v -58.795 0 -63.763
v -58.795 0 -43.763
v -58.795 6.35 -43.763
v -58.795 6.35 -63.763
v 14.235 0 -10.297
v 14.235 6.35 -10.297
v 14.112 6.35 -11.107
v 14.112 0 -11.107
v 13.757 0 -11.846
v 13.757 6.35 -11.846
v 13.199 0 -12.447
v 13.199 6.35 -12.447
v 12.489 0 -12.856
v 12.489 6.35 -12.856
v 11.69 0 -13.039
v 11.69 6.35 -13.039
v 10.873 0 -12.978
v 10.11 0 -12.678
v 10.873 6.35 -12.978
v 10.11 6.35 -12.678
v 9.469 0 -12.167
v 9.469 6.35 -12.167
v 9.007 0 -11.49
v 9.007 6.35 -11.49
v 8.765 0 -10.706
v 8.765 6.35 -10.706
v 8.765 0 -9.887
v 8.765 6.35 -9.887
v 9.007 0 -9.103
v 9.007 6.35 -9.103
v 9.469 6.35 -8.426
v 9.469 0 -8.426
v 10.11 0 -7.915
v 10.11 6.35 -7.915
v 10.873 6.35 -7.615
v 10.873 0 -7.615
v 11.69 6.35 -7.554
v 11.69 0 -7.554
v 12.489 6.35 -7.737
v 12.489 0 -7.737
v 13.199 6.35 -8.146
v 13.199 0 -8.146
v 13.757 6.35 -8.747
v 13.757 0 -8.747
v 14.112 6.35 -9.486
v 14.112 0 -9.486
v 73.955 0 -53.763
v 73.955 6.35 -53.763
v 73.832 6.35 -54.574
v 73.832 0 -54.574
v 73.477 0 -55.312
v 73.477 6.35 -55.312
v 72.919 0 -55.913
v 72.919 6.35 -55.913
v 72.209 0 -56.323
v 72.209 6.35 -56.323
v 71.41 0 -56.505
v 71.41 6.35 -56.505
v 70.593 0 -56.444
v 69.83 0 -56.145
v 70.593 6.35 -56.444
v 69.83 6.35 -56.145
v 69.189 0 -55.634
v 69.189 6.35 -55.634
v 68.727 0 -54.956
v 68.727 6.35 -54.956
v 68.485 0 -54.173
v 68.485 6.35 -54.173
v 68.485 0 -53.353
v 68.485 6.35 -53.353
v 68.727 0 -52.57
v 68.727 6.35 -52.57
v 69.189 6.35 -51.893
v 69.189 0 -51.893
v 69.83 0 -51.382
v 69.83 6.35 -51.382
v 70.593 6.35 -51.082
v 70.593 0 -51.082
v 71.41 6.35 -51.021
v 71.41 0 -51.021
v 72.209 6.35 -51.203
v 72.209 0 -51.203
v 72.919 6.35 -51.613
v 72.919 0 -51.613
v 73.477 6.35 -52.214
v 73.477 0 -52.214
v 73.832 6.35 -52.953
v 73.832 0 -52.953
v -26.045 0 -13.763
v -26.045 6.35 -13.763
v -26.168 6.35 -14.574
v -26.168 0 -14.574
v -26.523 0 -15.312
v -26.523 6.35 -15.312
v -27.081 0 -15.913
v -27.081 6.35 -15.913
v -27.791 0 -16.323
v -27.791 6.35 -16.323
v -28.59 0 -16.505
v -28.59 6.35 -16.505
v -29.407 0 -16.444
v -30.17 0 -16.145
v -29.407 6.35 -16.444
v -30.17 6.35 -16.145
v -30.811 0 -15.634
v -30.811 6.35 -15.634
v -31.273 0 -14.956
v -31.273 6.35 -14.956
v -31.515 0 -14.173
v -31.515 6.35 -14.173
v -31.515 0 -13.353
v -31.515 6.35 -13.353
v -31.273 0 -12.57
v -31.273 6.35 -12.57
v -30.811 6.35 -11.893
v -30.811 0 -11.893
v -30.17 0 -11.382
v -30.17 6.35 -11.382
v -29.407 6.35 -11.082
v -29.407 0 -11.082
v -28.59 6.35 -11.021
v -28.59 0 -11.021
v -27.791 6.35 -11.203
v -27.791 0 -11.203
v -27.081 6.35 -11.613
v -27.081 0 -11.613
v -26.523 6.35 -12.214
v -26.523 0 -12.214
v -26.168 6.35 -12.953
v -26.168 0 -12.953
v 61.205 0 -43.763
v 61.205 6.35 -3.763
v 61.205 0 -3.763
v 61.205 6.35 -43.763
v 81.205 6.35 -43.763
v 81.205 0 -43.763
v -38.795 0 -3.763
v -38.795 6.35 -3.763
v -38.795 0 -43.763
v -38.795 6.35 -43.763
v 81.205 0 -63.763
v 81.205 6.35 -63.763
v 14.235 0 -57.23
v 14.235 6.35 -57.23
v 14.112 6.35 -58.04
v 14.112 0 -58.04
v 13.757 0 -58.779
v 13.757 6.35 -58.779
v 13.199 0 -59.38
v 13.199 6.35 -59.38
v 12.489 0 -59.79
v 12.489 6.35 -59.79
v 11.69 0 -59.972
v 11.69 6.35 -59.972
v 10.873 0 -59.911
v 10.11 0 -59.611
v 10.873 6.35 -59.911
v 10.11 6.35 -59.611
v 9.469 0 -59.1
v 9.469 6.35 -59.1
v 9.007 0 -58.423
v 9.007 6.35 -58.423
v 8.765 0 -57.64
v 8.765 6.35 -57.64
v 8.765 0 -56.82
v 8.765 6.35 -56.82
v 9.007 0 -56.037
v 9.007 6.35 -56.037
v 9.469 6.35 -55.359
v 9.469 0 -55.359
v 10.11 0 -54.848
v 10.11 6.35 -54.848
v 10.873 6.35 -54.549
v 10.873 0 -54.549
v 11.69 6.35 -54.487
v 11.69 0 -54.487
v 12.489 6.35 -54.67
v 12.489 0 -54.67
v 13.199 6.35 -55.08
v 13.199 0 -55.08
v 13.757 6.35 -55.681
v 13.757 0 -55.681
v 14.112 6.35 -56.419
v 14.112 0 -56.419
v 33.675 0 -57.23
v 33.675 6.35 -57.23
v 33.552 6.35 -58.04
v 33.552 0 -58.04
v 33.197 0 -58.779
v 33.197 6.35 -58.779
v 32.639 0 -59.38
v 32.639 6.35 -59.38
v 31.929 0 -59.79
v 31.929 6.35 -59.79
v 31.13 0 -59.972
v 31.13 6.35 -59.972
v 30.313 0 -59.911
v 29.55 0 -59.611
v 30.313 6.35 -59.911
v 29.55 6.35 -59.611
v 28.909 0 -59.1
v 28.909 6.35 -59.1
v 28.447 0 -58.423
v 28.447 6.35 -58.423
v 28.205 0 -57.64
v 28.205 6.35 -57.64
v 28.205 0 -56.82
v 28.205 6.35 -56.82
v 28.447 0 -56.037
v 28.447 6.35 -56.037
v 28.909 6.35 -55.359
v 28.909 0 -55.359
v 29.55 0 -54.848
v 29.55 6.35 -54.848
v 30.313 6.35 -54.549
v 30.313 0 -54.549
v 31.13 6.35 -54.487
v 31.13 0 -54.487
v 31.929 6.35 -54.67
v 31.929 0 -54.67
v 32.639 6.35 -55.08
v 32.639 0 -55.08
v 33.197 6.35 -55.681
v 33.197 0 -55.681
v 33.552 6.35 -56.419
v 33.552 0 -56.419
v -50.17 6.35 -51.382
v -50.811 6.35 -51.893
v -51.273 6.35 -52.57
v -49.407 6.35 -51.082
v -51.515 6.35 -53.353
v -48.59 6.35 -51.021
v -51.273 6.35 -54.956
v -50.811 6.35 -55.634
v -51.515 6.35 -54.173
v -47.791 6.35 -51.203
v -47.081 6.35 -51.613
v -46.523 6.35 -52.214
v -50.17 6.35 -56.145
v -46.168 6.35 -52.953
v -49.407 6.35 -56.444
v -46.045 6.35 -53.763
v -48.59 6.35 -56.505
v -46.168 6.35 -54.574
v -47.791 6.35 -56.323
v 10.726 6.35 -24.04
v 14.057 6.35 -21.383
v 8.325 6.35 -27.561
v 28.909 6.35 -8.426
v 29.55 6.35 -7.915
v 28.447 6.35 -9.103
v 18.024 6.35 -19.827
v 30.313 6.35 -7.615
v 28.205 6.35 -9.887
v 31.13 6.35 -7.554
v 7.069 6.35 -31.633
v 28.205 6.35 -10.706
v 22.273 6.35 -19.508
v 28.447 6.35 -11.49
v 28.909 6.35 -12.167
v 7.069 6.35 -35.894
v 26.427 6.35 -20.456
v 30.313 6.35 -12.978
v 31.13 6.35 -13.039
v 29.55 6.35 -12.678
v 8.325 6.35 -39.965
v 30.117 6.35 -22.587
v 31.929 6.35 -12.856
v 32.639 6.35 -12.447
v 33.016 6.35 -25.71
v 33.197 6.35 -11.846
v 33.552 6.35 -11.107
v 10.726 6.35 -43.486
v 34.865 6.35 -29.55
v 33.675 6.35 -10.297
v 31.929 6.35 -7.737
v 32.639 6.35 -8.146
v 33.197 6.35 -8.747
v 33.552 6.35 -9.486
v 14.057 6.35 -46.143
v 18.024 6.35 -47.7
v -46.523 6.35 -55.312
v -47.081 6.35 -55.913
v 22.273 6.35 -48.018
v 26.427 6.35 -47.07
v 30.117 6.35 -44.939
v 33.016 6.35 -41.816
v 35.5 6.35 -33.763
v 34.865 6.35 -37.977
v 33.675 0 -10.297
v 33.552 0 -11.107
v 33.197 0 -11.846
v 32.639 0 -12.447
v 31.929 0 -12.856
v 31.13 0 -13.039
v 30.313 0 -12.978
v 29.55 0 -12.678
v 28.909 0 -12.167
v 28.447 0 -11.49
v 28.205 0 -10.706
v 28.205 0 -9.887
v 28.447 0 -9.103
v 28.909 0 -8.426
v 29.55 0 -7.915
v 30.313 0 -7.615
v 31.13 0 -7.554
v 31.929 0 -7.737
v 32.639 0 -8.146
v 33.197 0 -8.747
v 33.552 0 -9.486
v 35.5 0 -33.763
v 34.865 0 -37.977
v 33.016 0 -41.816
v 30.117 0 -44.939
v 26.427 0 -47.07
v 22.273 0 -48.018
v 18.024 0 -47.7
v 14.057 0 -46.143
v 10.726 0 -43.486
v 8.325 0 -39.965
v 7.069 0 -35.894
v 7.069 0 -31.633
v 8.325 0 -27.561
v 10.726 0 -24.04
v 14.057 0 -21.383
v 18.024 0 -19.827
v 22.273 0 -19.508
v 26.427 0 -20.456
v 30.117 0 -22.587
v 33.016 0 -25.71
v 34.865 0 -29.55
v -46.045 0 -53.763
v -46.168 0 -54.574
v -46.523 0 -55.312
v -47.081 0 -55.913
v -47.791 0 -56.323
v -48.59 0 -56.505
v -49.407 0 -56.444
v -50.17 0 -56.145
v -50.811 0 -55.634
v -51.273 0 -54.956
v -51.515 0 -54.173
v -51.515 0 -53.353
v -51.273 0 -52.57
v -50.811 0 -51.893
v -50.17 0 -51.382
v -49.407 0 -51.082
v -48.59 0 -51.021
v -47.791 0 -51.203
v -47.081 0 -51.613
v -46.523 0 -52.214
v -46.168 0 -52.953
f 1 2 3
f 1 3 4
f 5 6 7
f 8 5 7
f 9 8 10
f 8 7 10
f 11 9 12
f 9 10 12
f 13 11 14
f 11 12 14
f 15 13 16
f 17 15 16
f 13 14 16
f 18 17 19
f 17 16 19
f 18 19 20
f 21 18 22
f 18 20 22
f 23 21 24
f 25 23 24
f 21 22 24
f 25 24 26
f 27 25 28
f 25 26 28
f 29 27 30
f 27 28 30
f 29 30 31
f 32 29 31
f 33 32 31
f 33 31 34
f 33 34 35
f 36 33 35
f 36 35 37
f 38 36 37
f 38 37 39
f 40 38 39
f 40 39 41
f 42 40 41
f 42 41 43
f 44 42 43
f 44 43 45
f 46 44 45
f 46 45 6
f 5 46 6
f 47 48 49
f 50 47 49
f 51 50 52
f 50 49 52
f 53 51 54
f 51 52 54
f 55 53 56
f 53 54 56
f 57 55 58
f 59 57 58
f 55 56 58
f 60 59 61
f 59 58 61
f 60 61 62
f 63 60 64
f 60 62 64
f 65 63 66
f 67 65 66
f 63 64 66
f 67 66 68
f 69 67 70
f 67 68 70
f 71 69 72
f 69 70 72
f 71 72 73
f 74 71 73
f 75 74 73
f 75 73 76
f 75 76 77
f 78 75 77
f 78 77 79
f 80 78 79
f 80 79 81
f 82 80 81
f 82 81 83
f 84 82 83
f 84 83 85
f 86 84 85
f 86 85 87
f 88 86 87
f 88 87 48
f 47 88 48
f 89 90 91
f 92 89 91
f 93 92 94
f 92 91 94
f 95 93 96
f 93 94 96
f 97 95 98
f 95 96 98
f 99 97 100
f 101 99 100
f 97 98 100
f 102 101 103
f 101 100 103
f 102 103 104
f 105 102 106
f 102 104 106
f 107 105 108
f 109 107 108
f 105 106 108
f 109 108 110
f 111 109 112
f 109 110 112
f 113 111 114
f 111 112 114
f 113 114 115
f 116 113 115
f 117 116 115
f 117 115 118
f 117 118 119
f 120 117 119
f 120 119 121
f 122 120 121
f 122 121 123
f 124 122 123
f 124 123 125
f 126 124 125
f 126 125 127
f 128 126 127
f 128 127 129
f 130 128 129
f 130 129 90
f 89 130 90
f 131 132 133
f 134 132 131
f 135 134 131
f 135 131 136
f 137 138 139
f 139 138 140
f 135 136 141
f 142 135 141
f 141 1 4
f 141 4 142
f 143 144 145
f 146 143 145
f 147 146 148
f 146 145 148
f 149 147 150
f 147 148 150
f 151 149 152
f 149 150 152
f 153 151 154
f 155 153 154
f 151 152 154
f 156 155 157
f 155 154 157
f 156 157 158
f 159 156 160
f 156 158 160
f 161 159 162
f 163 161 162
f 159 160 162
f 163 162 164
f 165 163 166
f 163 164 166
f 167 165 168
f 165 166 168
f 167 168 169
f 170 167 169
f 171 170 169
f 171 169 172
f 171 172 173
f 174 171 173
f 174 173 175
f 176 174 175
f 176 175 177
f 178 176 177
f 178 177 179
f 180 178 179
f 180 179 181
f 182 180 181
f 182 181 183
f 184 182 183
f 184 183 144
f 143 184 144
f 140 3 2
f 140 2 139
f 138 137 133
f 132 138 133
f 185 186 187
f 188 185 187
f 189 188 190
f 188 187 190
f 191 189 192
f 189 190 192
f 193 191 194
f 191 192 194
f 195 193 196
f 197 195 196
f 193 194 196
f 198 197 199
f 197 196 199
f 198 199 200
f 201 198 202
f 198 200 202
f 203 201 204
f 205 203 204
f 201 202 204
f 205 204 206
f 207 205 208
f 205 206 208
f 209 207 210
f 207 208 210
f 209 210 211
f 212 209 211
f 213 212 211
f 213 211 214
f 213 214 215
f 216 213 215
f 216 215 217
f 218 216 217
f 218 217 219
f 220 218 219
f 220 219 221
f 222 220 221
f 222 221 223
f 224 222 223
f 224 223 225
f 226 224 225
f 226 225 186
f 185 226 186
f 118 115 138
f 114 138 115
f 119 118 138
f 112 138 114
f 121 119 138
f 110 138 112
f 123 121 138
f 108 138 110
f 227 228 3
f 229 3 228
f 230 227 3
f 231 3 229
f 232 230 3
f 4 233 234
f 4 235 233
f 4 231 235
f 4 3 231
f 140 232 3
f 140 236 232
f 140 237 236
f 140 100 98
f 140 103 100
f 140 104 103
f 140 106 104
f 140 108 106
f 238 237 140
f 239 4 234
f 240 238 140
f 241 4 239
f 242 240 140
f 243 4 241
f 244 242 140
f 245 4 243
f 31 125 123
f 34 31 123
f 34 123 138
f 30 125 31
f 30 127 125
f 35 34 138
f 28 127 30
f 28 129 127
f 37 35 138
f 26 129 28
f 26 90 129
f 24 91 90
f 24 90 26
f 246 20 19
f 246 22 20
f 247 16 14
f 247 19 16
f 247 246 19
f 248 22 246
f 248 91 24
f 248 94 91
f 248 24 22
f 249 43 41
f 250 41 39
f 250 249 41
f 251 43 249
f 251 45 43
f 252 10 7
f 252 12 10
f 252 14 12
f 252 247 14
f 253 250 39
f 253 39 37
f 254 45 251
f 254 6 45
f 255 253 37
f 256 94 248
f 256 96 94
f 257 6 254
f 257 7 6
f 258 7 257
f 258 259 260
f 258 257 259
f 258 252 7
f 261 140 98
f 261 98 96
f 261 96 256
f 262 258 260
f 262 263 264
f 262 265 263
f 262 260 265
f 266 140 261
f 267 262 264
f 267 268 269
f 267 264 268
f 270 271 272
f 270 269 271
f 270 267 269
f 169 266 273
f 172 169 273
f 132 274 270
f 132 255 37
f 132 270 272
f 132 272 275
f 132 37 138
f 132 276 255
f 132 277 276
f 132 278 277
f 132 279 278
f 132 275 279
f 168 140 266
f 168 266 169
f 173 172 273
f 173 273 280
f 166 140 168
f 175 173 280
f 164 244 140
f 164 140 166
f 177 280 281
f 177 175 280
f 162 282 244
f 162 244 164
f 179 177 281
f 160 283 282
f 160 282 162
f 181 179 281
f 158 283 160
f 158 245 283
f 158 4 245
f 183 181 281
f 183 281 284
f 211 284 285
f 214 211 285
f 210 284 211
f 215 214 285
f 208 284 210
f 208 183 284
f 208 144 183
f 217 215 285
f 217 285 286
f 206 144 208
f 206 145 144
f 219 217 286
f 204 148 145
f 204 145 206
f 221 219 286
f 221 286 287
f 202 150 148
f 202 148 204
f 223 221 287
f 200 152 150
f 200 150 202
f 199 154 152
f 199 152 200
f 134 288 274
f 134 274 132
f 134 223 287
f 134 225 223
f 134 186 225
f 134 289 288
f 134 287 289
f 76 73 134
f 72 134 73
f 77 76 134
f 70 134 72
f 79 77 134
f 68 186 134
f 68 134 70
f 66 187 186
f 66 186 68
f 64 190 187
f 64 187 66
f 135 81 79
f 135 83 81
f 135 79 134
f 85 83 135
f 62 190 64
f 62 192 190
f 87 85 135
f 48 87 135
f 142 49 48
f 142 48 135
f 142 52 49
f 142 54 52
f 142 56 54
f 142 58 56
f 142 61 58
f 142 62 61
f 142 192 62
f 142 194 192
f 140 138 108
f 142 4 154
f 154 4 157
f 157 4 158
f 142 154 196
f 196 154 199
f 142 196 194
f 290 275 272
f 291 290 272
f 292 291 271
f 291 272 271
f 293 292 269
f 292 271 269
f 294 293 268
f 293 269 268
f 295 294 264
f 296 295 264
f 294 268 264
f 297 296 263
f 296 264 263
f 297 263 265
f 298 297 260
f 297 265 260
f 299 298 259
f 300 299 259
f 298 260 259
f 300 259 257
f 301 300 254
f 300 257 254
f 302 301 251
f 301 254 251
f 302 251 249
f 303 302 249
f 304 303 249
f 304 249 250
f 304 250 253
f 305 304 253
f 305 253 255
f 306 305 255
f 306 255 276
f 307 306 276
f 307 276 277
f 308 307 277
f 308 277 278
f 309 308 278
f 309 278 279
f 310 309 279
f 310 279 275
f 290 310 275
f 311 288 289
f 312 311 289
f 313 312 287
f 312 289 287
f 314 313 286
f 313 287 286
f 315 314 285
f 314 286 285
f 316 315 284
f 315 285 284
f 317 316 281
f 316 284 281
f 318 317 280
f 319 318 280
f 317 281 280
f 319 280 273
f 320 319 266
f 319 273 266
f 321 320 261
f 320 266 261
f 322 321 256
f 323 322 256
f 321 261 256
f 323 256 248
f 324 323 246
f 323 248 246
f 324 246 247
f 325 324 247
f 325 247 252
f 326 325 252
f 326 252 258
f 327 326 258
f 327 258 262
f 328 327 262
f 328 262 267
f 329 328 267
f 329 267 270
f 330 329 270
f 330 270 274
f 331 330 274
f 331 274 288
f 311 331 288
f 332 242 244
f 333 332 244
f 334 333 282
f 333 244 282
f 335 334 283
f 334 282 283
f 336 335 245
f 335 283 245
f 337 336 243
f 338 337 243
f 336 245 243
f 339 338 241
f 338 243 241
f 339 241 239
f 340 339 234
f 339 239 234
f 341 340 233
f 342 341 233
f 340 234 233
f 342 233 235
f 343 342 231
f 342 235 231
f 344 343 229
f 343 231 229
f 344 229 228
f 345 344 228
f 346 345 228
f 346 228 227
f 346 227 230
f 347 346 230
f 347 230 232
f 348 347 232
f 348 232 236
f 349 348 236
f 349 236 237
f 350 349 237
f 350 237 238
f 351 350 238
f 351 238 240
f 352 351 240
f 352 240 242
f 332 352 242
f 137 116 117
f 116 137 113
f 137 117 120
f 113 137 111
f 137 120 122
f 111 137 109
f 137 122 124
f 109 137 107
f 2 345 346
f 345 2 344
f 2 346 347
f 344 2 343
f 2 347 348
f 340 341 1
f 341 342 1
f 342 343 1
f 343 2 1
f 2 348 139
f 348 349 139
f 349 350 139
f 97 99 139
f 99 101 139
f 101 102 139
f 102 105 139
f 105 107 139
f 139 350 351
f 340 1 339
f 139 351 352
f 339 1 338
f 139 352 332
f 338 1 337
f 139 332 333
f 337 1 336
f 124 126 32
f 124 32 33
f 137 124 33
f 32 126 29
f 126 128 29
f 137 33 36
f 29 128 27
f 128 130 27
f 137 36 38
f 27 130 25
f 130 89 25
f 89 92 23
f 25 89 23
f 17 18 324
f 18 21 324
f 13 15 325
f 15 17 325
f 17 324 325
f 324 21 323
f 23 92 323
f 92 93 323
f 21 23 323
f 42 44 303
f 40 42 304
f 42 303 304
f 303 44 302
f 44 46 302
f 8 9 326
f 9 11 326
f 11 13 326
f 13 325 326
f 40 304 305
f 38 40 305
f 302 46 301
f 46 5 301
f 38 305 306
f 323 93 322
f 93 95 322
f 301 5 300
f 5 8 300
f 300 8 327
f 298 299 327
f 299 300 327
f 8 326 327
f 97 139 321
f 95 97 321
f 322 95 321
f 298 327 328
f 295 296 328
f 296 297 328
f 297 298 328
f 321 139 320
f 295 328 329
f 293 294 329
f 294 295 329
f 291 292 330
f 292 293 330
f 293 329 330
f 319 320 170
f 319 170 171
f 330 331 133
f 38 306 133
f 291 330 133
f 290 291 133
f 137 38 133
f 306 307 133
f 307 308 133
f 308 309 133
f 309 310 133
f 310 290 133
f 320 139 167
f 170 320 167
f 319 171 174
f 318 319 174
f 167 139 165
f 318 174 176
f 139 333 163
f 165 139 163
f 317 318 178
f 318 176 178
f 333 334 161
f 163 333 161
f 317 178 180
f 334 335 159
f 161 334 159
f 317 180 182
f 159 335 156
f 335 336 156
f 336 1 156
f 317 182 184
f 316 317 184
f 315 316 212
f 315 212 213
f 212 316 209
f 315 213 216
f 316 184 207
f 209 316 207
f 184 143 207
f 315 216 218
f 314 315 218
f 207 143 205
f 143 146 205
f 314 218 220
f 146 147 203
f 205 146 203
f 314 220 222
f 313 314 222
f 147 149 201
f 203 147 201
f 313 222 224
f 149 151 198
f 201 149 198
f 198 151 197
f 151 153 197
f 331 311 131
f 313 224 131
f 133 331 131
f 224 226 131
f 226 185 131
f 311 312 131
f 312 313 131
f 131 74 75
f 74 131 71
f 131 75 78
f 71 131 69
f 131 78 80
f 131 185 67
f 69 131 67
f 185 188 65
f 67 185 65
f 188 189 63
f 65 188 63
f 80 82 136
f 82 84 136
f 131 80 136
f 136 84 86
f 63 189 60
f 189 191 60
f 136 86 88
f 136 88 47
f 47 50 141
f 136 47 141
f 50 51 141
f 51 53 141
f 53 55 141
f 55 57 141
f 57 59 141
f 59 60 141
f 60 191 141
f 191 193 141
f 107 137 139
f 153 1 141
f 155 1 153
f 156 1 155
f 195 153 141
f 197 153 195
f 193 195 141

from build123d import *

# Parameters (mm, degrees)
SKETCH1_W           = 140
SKETCH1_H           = 60
BOSS_EXTRUDE1_DEPTH = 6.35
SKETCH3_R           = 14.295
SKETCH3_R_2         = 2.75
CUT_EXTRUDE2_DEPTH  = 7.35
CUT_EXTRUDE3_REACH  = 8.35
SKETCH4_R           = 2.75
SKETCH4_W           = 20
SKETCH4_H           = 40


with BuildPart() as part:
    # Sketch1 → Boss-Extrude1 (new body)
    with BuildSketch(Plane(origin=(0, 0, 0), x_dir=(1, 0, 0), z_dir=(0, 1, 0))):
        with Locations((11.204600864, 33.763107794)):
            Rectangle(SKETCH1_W, SKETCH1_H)
    extrude(amount=BOSS_EXTRUDE1_DEPTH)

    # Sketch3 → Cut-Extrude2 (cut, through all)
    with BuildSketch(Plane(origin=(0, 6.35, 0), x_dir=(1, 0, 0), z_dir=(0, 1, 0))):
        with Locations((21.204600864, 33.763107794)):
            Circle(SKETCH3_R)
        with Locations((30.924600864, 10.296501734)):
            Circle(SKETCH3_R_2)
        with Locations((11.484600864, 10.296501734)):
            Circle(SKETCH3_R_2)
        with Locations((11.484600864, 57.229713855)):
            Circle(SKETCH3_R_2)
        with Locations((30.924600864, 57.229713855)):
            Circle(SKETCH3_R_2)
    extrude(amount=-CUT_EXTRUDE2_DEPTH, mode=Mode.SUBTRACT)

    # Sketch4 → Cut-Extrude3 (cut, up to next)
    with BuildSketch(Plane(origin=(0, 6.35, 0), x_dir=(1, 0, 0), z_dir=(0, 1, 0)), mode=Mode.PRIVATE) as cut_extrude3_sk1:
        with Locations((71.204600864, 53.763107794)):
            Circle(SKETCH4_R)
    cut_extrude3_tool1 = extrude(cut_extrude3_sk1.sketch, amount=-CUT_EXTRUDE3_REACH, mode=Mode.PRIVATE) & part.part
    add(cut_extrude3_tool1.solids().sort_by_distance((71.204601, 6.35, -53.763108))[0], mode=Mode.SUBTRACT)
    # Sketch4 → Cut-Extrude3 (cut, up to next)
    with BuildSketch(Plane(origin=(0, 6.35, 0), x_dir=(1, 0, 0), z_dir=(0, 1, 0)), mode=Mode.PRIVATE) as cut_extrude3_sk2:
        with Locations((-48.795399136, 53.763107794)):
            Circle(SKETCH4_R)
    cut_extrude3_tool2 = extrude(cut_extrude3_sk2.sketch, amount=-CUT_EXTRUDE3_REACH, mode=Mode.PRIVATE) & part.part
    add(cut_extrude3_tool2.solids().sort_by_distance((-48.795399, 6.35, -53.763108))[0], mode=Mode.SUBTRACT)
    # Sketch4 → Cut-Extrude3 (cut, up to next)
    with BuildSketch(Plane(origin=(0, 6.35, 0), x_dir=(1, 0, 0), z_dir=(0, 1, 0)), mode=Mode.PRIVATE) as cut_extrude3_sk3:
        with Locations((-28.795399136, 13.763107794)):
            Circle(SKETCH4_R)
    cut_extrude3_tool3 = extrude(cut_extrude3_sk3.sketch, amount=-CUT_EXTRUDE3_REACH, mode=Mode.PRIVATE) & part.part
    add(cut_extrude3_tool3.solids().sort_by_distance((-28.795399, 6.35, -13.763108))[0], mode=Mode.SUBTRACT)
    # Sketch4 → Cut-Extrude3 (cut, up to next)
    with BuildSketch(Plane(origin=(0, 6.35, 0), x_dir=(1, 0, 0), z_dir=(0, 1, 0)), mode=Mode.PRIVATE) as cut_extrude3_sk4:
        with Locations((71.204600864, 23.763107794)):
            Rectangle(SKETCH4_W, SKETCH4_H)
    cut_extrude3_tool4 = extrude(cut_extrude3_sk4.sketch, amount=-CUT_EXTRUDE3_REACH, mode=Mode.PRIVATE) & part.part
    add(cut_extrude3_tool4.solids().sort_by_distance((71.204601, 6.35, -23.763108))[0], mode=Mode.SUBTRACT)
    # Sketch4 → Cut-Extrude3 (cut, up to next)
    with BuildSketch(Plane(origin=(0, 6.35, 0), x_dir=(1, 0, 0), z_dir=(0, 1, 0)), mode=Mode.PRIVATE) as cut_extrude3_sk5:
        with Locations((-48.795399136, 23.763107794)):
            Rectangle(SKETCH4_W, SKETCH4_H)
    cut_extrude3_tool5 = extrude(cut_extrude3_sk5.sketch, amount=-CUT_EXTRUDE3_REACH, mode=Mode.PRIVATE) & part.part
    add(cut_extrude3_tool5.solids().sort_by_distance((-48.795399, 6.35, -23.763108))[0], mode=Mode.SUBTRACT)


solid = part.part
